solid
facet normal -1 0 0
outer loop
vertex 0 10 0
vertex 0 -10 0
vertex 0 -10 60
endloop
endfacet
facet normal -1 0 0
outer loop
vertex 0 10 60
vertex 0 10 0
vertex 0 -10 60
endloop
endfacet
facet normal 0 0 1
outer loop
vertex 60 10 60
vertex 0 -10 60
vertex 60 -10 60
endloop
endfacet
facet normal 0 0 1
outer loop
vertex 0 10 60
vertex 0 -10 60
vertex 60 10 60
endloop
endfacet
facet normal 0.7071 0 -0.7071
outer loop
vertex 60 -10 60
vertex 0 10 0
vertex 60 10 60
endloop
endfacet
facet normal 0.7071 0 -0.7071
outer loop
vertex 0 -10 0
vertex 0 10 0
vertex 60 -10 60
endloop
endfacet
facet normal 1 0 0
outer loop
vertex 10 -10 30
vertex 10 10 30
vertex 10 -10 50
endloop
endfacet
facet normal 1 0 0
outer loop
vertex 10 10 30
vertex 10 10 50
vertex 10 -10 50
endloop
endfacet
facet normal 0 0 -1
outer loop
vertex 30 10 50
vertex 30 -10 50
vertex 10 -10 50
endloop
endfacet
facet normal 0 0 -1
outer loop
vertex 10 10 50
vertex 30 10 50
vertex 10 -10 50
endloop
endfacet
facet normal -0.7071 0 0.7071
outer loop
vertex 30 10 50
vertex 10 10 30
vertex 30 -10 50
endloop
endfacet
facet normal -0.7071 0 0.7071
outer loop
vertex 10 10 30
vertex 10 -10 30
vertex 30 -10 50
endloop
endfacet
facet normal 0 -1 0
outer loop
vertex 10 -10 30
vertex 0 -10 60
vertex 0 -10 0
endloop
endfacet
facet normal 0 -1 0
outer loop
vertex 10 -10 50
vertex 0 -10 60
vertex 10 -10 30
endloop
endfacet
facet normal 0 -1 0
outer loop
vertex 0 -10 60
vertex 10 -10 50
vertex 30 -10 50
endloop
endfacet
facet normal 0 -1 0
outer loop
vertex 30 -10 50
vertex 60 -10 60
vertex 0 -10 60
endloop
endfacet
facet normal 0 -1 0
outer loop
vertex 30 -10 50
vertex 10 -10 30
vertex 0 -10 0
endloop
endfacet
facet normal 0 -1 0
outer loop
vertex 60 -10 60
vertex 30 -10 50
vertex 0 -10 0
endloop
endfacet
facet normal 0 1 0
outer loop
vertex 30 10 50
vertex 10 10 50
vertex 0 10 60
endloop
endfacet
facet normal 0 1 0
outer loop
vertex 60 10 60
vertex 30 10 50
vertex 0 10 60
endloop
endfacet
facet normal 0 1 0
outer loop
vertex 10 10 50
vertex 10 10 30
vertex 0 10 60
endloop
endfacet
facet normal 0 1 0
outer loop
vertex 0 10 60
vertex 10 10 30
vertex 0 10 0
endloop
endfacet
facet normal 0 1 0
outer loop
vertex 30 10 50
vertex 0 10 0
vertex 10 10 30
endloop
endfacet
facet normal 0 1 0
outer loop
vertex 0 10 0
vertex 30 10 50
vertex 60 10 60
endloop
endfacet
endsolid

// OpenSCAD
polyhedron
    (points = [
	       [0, -10, 60], [0, 10, 60], [0, 10, 0], [0, -10, 0], [60, -10, 60], [60, 10, 60], 
	       [10, -10, 50], [10, 10, 50], [10, 10, 30], [10, -10, 30], [30, -10, 50], [30, 10, 50]
	       ], 
     triangles = [
		  [0,3,2],  [0,2,1],  [4,0,5],  [5,0,1],  [5,2,4],  [4,2,3],
                  [6,8,9],  [6,7,8],  [6,10,11],[6,11,7], [10,8,11],
		  [10,9,8], [3,0,9],  [9,0,6],  [10,6, 0],[0,4,10],
                  [3,9,10], [3,10,4], [1,7,11], [1,11,5], [1,8,7],  
                  [2,8,1],  [8,2,11], [5,11,2]
		  ]
     );
